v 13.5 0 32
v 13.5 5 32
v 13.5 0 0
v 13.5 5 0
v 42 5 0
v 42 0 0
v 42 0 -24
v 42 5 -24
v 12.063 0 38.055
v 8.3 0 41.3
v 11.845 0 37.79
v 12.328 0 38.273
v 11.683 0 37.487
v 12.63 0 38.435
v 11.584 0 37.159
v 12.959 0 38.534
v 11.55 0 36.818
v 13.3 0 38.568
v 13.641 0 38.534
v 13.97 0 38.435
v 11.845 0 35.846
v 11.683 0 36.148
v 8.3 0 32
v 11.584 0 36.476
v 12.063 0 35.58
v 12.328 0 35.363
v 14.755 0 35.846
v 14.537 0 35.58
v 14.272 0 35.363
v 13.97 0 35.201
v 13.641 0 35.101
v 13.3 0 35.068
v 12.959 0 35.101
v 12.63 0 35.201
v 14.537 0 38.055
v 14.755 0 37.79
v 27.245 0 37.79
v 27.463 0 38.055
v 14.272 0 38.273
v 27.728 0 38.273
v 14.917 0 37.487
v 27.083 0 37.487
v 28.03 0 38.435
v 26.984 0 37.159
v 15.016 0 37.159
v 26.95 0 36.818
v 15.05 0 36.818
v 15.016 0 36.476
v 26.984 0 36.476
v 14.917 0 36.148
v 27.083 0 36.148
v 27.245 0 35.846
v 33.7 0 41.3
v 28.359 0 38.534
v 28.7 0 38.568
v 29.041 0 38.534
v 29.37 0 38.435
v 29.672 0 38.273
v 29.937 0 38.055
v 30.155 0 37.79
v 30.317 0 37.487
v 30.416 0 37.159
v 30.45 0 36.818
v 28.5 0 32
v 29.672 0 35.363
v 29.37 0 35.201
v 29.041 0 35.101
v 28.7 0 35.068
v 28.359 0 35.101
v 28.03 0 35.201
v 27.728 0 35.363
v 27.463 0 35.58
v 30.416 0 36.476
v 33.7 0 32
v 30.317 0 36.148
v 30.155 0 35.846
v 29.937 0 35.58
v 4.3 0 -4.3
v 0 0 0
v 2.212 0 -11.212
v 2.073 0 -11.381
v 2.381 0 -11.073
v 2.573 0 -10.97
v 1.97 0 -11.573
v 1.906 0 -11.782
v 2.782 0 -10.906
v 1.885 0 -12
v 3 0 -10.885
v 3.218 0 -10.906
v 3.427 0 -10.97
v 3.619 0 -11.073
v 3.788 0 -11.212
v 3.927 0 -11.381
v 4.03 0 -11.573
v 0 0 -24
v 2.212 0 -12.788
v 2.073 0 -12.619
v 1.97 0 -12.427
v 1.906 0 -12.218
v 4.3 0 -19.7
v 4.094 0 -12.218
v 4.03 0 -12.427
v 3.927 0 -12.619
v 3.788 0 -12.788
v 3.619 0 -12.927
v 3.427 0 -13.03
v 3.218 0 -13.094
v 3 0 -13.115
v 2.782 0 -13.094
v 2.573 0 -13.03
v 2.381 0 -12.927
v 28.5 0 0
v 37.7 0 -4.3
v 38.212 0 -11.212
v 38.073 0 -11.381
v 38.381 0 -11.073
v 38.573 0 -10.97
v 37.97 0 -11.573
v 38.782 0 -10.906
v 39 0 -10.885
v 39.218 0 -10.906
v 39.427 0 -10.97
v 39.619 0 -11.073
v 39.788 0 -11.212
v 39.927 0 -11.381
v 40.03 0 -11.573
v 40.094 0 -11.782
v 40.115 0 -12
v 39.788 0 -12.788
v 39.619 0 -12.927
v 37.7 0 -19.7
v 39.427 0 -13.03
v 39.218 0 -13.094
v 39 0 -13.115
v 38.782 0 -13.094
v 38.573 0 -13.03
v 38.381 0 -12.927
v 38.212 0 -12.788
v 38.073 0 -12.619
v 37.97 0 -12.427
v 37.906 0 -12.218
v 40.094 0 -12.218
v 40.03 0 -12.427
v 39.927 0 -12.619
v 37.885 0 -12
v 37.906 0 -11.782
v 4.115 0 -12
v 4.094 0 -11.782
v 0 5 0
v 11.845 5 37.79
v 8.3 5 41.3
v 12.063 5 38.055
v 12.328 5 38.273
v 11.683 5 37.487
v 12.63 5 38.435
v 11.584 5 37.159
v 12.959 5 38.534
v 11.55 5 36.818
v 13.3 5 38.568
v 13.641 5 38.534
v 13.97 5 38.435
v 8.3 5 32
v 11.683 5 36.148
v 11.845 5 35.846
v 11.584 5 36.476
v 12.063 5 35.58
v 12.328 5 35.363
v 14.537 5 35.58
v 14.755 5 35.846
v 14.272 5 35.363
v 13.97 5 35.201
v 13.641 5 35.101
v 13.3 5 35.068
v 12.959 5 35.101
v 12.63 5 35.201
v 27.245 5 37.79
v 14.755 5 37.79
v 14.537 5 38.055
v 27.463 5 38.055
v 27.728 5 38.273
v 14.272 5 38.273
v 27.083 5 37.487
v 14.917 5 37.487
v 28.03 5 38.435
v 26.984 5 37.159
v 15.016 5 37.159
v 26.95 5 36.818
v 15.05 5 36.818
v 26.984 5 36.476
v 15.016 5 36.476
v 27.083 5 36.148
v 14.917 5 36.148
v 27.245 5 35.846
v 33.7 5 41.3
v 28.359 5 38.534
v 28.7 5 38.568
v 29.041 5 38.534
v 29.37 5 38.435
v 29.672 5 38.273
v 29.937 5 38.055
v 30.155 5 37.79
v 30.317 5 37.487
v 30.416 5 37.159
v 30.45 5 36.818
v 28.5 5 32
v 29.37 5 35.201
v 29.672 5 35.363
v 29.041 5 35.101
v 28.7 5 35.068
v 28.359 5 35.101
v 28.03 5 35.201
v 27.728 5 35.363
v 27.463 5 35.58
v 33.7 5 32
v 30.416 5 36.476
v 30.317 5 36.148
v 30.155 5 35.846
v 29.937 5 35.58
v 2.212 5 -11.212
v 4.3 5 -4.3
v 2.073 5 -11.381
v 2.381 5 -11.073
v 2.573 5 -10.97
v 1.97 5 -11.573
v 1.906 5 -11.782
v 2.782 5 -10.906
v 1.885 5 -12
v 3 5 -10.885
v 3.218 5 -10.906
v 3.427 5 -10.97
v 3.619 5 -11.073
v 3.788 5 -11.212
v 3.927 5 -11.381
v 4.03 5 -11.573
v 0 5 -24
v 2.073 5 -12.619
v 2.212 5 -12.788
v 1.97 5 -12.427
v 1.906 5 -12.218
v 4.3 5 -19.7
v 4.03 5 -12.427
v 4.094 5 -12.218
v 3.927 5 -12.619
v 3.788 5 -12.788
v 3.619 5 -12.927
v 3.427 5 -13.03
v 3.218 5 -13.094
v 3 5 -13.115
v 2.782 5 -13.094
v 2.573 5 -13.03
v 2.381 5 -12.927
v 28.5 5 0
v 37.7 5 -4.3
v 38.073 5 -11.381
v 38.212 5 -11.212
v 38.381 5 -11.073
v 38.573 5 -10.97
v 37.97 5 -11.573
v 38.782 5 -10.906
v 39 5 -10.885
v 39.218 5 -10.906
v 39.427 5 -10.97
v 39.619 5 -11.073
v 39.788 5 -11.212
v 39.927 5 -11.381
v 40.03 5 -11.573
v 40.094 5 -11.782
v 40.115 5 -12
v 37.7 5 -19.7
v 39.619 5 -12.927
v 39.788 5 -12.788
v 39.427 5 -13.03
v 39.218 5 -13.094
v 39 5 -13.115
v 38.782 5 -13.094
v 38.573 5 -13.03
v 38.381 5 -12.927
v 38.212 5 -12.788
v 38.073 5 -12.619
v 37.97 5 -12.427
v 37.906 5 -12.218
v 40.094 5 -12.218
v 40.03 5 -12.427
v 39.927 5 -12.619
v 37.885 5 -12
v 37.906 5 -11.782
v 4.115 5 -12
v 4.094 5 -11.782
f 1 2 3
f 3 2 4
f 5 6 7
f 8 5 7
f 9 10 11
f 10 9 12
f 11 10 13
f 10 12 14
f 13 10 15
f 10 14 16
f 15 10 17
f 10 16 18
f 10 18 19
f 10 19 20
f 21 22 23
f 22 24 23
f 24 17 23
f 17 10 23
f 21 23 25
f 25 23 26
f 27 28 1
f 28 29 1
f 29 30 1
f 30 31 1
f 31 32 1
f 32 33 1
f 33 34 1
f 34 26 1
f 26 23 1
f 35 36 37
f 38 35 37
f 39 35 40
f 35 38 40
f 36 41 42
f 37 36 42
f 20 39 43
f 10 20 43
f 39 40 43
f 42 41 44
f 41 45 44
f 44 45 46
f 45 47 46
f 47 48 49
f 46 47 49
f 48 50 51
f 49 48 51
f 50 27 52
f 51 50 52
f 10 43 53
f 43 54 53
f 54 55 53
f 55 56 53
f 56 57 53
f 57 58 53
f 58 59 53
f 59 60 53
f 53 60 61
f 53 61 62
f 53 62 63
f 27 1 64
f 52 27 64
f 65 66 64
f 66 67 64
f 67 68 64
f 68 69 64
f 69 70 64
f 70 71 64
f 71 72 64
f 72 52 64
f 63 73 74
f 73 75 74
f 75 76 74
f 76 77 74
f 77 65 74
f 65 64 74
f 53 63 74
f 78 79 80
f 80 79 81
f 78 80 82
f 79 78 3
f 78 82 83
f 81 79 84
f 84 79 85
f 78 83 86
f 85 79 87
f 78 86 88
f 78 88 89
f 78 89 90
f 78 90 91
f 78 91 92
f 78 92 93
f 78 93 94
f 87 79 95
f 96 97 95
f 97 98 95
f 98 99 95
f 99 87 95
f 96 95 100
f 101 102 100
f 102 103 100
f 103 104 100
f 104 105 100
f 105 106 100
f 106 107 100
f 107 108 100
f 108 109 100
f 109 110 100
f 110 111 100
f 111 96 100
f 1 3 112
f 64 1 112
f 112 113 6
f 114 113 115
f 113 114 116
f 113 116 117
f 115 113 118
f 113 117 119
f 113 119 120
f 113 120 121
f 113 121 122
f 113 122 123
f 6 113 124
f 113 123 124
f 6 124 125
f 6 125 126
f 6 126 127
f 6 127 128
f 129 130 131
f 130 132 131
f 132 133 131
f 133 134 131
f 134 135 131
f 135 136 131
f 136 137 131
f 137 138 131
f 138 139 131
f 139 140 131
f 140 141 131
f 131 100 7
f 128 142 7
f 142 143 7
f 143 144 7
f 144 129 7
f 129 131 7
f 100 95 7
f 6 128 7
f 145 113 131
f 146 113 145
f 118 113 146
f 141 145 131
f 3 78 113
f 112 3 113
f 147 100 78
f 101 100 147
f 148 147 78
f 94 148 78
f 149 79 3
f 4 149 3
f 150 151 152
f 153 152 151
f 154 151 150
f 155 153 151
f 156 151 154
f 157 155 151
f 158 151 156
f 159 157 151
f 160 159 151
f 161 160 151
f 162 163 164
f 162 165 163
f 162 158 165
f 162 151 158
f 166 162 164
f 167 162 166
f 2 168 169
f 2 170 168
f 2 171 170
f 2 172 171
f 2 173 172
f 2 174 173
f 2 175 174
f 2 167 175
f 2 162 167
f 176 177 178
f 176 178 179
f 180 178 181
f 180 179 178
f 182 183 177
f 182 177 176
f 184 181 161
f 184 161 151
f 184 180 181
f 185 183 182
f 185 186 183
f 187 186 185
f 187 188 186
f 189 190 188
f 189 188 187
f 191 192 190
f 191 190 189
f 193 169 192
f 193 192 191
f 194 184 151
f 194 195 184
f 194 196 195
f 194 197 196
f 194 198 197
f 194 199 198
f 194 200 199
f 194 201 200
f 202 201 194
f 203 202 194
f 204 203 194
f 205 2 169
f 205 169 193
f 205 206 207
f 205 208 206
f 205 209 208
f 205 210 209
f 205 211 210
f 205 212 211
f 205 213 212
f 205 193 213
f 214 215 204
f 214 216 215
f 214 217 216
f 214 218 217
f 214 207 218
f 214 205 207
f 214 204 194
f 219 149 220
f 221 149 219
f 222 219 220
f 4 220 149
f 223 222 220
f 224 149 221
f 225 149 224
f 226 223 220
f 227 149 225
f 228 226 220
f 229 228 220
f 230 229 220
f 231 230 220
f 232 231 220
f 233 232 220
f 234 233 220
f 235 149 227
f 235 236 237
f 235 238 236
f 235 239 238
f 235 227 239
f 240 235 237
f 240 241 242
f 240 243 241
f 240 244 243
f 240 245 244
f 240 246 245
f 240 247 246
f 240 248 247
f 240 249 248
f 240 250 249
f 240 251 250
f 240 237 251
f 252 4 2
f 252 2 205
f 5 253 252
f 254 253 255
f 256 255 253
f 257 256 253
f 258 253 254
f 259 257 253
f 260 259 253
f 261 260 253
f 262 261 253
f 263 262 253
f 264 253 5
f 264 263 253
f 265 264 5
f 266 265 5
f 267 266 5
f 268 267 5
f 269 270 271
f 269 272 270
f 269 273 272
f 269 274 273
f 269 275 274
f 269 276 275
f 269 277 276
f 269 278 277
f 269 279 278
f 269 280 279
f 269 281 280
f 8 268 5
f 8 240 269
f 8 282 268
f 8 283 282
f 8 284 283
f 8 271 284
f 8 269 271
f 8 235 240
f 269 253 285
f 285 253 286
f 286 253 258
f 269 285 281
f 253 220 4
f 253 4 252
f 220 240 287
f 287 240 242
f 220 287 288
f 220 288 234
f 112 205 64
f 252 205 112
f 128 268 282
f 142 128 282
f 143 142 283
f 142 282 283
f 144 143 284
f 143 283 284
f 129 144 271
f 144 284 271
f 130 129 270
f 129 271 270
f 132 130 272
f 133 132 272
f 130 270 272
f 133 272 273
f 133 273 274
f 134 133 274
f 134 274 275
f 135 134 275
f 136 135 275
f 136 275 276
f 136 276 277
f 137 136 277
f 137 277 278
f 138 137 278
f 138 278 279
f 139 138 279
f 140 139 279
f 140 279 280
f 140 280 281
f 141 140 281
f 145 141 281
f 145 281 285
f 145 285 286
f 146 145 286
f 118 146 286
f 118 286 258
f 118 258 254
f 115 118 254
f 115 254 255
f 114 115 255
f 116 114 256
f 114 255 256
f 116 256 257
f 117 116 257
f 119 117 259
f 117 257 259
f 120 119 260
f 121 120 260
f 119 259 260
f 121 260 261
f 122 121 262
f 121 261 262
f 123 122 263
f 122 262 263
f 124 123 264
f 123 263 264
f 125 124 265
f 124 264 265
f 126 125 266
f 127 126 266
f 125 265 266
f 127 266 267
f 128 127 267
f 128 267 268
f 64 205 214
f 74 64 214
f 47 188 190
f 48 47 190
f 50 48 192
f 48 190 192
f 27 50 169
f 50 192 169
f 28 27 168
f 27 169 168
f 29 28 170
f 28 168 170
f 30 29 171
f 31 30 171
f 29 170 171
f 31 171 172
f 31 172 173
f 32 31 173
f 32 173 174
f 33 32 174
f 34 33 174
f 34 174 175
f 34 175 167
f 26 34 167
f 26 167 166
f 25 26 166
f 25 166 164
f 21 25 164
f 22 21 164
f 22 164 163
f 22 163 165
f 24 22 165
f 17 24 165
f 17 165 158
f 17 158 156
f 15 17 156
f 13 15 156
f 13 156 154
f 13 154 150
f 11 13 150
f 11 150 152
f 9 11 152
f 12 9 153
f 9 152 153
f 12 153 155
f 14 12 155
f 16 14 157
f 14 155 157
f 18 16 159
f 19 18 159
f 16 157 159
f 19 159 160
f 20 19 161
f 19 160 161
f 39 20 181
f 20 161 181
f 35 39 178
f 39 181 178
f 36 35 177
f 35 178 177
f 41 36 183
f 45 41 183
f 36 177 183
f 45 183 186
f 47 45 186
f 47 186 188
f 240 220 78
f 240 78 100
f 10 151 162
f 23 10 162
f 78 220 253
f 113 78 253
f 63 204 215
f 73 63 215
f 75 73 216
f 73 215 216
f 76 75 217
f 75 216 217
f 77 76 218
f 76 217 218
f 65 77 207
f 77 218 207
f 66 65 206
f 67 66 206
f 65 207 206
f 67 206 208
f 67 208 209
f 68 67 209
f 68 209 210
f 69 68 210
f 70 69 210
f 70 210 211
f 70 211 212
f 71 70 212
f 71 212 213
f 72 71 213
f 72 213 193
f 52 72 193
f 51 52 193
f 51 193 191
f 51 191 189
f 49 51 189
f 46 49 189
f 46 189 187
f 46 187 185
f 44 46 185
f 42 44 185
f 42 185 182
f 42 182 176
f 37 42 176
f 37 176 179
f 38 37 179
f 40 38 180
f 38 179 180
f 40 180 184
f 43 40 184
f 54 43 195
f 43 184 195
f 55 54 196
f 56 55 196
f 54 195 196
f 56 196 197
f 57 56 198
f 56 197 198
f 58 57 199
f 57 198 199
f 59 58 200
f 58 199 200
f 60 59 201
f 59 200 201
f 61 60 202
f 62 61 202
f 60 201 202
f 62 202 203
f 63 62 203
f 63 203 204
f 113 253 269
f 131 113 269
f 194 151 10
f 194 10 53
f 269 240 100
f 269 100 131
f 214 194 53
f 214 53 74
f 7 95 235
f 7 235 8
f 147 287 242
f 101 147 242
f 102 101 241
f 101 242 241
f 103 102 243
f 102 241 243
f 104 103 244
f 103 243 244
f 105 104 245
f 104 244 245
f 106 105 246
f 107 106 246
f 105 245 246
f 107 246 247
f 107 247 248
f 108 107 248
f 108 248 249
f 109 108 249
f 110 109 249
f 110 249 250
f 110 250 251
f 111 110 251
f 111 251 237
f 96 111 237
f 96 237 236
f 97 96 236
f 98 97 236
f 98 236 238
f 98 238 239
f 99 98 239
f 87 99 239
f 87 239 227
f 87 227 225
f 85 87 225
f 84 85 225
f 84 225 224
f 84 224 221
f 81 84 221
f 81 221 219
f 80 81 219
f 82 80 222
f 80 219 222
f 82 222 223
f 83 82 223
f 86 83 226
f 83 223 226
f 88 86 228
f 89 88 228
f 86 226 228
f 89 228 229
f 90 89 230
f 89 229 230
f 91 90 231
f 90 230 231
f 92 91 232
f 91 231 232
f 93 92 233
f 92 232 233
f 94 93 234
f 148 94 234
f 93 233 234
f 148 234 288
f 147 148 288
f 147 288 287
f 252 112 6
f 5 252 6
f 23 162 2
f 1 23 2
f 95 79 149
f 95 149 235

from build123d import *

# Parameters (mm, degrees)
SKETCH1_W           = 42
SKETCH1_H           = 24
BOSS_EXTRUDE1_DEPTH = 5
SKETCH2_W           = 33.4
SKETCH2_H           = 15.4
CUT_EXTRUDE1_DEPTH  = 6
SKETCH3_W           = 15
SKETCH3_H           = 32
BOSS_EXTRUDE2_DEPTH = 5
SKETCH4_W           = 25.4
SKETCH4_H           = 9.3
BOSS_EXTRUDE3_DEPTH = 5
SKETCH5_R           = 1.75
CUT_EXTRUDE2_DEPTH  = 6
SKETCH6_R           = 1.115
CUT_EXTRUDE3_DEPTH  = 6


with BuildPart() as part:
    # Sketch1 → Boss-Extrude1 (new body)
    with BuildSketch(Plane(origin=(0, 0, 0), x_dir=(1, 0, 0), z_dir=(0, 1, 0))):
        with Locations((21, 12)):
            Rectangle(SKETCH1_W, SKETCH1_H)
    extrude(amount=BOSS_EXTRUDE1_DEPTH)

    # Sketch2 → Cut-Extrude1 (cut, through all)
    with BuildSketch(Plane(origin=(0, 5, 0), x_dir=(1, 0, 0), z_dir=(0, 1, 0))):
        with Locations((21, 12)):
            Rectangle(SKETCH2_W, SKETCH2_H)
    extrude(amount=-CUT_EXTRUDE1_DEPTH, mode=Mode.SUBTRACT)

    # Sketch3 → Boss-Extrude2 (add)
    with BuildSketch(Plane(origin=(0, 5, 0), x_dir=(1, 0, 0), z_dir=(0, 1, 0))):
        with Locations((21, -16)):
            Rectangle(SKETCH3_W, SKETCH3_H)
    extrude(amount=-BOSS_EXTRUDE2_DEPTH)

    # Sketch4 → Boss-Extrude3 (add)
    with BuildSketch(Plane(origin=(0, 5, 0), x_dir=(1, 0, 0), z_dir=(0, 1, 0))):
        with Locations((21, -36.65)):
            Rectangle(SKETCH4_W, SKETCH4_H)
    extrude(amount=-BOSS_EXTRUDE3_DEPTH)

    # Sketch5 → Cut-Extrude2 (cut, through all)
    with BuildSketch(Plane(origin=(0, 5, 0), x_dir=(1, 0, 0), z_dir=(0, 1, 0))):
        with Locations((13.3, -36.81777032)):
            Circle(SKETCH5_R)
        with Locations((28.7, -36.81777032)):
            Circle(SKETCH5_R)
    extrude(amount=-CUT_EXTRUDE2_DEPTH, mode=Mode.SUBTRACT)

    # Sketch6 → Cut-Extrude3 (cut, through all)
    with BuildSketch(Plane(origin=(0, 5, 0), x_dir=(1, 0, 0), z_dir=(0, 1, 0))):
        with Locations((3, 12)):
            Circle(SKETCH6_R)
        with Locations((39, 12)):
            Circle(SKETCH6_R)
    extrude(amount=-CUT_EXTRUDE3_DEPTH, mode=Mode.SUBTRACT)


solid = part.part
